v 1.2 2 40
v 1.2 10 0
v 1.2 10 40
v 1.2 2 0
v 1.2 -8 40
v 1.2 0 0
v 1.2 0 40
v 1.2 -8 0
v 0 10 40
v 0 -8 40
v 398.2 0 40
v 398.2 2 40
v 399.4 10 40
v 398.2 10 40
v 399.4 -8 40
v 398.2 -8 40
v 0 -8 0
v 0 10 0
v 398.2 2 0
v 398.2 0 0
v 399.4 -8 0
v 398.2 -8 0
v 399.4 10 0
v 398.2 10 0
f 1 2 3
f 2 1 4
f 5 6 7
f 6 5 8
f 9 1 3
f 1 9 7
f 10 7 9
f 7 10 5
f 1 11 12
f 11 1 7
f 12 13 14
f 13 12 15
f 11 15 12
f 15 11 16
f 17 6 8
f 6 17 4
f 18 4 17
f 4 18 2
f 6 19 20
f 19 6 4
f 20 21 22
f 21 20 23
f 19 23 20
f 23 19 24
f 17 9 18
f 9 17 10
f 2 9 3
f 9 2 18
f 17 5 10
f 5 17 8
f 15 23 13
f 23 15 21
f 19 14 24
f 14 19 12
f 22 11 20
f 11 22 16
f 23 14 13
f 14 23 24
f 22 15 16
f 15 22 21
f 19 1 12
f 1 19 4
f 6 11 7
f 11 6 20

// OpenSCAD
// assembl / living — drawer fit · free divider
// --------------------------------------------
// A standalone divider that wedges across a drawer with soft end feet, for
// drawers that get dividers but no tray (cutlery, linen, socks). Length is
// the measured inside dimension less clearance; the feet give a little
// spring. No library dependencies. Proposed, unprinted, not for sale.

/* [Drawer, measured inside, in mm] */
span          = 400;   // inside dimension the divider crosses
drawer_height = 60;

/* [Divider] */
clearance     = 0.6;   // total; the feet take up the rest
height        = 40;    // keep below drawer_height minus 5
thickness     = 2.0;
foot_length   = 18;    // the flat foot at each end that touches the drawer side
foot_t        = 1.2;   // foot plate thickness; thinner flexes more
notch_pitch   = 0;     // 0 = none; otherwise notches every n mm for crossing dividers
notch_depth   = 20;

$fn = 32;

len = span - clearance;
h = min(height, drawer_height - 5);

module blade() { cube([len, thickness, h]); }

module feet() {
    for (x = [0, len - foot_t])
        translate([x, -foot_length / 2 + thickness / 2, 0]) cube([foot_t, foot_length, h]);
}

module notches() {
    if (notch_pitch > 0)
        for (x = [notch_pitch : notch_pitch : len - notch_pitch])
            translate([x - thickness / 2 - 0.2, -1, h - notch_depth]) cube([thickness + 0.4, thickness + 2, notch_depth + 1]);
}

difference() { union() { blade(); feet(); } notches(); }

echo(str("divider ", len, " × ", h, " mm, feet ", foot_length, " mm"));
